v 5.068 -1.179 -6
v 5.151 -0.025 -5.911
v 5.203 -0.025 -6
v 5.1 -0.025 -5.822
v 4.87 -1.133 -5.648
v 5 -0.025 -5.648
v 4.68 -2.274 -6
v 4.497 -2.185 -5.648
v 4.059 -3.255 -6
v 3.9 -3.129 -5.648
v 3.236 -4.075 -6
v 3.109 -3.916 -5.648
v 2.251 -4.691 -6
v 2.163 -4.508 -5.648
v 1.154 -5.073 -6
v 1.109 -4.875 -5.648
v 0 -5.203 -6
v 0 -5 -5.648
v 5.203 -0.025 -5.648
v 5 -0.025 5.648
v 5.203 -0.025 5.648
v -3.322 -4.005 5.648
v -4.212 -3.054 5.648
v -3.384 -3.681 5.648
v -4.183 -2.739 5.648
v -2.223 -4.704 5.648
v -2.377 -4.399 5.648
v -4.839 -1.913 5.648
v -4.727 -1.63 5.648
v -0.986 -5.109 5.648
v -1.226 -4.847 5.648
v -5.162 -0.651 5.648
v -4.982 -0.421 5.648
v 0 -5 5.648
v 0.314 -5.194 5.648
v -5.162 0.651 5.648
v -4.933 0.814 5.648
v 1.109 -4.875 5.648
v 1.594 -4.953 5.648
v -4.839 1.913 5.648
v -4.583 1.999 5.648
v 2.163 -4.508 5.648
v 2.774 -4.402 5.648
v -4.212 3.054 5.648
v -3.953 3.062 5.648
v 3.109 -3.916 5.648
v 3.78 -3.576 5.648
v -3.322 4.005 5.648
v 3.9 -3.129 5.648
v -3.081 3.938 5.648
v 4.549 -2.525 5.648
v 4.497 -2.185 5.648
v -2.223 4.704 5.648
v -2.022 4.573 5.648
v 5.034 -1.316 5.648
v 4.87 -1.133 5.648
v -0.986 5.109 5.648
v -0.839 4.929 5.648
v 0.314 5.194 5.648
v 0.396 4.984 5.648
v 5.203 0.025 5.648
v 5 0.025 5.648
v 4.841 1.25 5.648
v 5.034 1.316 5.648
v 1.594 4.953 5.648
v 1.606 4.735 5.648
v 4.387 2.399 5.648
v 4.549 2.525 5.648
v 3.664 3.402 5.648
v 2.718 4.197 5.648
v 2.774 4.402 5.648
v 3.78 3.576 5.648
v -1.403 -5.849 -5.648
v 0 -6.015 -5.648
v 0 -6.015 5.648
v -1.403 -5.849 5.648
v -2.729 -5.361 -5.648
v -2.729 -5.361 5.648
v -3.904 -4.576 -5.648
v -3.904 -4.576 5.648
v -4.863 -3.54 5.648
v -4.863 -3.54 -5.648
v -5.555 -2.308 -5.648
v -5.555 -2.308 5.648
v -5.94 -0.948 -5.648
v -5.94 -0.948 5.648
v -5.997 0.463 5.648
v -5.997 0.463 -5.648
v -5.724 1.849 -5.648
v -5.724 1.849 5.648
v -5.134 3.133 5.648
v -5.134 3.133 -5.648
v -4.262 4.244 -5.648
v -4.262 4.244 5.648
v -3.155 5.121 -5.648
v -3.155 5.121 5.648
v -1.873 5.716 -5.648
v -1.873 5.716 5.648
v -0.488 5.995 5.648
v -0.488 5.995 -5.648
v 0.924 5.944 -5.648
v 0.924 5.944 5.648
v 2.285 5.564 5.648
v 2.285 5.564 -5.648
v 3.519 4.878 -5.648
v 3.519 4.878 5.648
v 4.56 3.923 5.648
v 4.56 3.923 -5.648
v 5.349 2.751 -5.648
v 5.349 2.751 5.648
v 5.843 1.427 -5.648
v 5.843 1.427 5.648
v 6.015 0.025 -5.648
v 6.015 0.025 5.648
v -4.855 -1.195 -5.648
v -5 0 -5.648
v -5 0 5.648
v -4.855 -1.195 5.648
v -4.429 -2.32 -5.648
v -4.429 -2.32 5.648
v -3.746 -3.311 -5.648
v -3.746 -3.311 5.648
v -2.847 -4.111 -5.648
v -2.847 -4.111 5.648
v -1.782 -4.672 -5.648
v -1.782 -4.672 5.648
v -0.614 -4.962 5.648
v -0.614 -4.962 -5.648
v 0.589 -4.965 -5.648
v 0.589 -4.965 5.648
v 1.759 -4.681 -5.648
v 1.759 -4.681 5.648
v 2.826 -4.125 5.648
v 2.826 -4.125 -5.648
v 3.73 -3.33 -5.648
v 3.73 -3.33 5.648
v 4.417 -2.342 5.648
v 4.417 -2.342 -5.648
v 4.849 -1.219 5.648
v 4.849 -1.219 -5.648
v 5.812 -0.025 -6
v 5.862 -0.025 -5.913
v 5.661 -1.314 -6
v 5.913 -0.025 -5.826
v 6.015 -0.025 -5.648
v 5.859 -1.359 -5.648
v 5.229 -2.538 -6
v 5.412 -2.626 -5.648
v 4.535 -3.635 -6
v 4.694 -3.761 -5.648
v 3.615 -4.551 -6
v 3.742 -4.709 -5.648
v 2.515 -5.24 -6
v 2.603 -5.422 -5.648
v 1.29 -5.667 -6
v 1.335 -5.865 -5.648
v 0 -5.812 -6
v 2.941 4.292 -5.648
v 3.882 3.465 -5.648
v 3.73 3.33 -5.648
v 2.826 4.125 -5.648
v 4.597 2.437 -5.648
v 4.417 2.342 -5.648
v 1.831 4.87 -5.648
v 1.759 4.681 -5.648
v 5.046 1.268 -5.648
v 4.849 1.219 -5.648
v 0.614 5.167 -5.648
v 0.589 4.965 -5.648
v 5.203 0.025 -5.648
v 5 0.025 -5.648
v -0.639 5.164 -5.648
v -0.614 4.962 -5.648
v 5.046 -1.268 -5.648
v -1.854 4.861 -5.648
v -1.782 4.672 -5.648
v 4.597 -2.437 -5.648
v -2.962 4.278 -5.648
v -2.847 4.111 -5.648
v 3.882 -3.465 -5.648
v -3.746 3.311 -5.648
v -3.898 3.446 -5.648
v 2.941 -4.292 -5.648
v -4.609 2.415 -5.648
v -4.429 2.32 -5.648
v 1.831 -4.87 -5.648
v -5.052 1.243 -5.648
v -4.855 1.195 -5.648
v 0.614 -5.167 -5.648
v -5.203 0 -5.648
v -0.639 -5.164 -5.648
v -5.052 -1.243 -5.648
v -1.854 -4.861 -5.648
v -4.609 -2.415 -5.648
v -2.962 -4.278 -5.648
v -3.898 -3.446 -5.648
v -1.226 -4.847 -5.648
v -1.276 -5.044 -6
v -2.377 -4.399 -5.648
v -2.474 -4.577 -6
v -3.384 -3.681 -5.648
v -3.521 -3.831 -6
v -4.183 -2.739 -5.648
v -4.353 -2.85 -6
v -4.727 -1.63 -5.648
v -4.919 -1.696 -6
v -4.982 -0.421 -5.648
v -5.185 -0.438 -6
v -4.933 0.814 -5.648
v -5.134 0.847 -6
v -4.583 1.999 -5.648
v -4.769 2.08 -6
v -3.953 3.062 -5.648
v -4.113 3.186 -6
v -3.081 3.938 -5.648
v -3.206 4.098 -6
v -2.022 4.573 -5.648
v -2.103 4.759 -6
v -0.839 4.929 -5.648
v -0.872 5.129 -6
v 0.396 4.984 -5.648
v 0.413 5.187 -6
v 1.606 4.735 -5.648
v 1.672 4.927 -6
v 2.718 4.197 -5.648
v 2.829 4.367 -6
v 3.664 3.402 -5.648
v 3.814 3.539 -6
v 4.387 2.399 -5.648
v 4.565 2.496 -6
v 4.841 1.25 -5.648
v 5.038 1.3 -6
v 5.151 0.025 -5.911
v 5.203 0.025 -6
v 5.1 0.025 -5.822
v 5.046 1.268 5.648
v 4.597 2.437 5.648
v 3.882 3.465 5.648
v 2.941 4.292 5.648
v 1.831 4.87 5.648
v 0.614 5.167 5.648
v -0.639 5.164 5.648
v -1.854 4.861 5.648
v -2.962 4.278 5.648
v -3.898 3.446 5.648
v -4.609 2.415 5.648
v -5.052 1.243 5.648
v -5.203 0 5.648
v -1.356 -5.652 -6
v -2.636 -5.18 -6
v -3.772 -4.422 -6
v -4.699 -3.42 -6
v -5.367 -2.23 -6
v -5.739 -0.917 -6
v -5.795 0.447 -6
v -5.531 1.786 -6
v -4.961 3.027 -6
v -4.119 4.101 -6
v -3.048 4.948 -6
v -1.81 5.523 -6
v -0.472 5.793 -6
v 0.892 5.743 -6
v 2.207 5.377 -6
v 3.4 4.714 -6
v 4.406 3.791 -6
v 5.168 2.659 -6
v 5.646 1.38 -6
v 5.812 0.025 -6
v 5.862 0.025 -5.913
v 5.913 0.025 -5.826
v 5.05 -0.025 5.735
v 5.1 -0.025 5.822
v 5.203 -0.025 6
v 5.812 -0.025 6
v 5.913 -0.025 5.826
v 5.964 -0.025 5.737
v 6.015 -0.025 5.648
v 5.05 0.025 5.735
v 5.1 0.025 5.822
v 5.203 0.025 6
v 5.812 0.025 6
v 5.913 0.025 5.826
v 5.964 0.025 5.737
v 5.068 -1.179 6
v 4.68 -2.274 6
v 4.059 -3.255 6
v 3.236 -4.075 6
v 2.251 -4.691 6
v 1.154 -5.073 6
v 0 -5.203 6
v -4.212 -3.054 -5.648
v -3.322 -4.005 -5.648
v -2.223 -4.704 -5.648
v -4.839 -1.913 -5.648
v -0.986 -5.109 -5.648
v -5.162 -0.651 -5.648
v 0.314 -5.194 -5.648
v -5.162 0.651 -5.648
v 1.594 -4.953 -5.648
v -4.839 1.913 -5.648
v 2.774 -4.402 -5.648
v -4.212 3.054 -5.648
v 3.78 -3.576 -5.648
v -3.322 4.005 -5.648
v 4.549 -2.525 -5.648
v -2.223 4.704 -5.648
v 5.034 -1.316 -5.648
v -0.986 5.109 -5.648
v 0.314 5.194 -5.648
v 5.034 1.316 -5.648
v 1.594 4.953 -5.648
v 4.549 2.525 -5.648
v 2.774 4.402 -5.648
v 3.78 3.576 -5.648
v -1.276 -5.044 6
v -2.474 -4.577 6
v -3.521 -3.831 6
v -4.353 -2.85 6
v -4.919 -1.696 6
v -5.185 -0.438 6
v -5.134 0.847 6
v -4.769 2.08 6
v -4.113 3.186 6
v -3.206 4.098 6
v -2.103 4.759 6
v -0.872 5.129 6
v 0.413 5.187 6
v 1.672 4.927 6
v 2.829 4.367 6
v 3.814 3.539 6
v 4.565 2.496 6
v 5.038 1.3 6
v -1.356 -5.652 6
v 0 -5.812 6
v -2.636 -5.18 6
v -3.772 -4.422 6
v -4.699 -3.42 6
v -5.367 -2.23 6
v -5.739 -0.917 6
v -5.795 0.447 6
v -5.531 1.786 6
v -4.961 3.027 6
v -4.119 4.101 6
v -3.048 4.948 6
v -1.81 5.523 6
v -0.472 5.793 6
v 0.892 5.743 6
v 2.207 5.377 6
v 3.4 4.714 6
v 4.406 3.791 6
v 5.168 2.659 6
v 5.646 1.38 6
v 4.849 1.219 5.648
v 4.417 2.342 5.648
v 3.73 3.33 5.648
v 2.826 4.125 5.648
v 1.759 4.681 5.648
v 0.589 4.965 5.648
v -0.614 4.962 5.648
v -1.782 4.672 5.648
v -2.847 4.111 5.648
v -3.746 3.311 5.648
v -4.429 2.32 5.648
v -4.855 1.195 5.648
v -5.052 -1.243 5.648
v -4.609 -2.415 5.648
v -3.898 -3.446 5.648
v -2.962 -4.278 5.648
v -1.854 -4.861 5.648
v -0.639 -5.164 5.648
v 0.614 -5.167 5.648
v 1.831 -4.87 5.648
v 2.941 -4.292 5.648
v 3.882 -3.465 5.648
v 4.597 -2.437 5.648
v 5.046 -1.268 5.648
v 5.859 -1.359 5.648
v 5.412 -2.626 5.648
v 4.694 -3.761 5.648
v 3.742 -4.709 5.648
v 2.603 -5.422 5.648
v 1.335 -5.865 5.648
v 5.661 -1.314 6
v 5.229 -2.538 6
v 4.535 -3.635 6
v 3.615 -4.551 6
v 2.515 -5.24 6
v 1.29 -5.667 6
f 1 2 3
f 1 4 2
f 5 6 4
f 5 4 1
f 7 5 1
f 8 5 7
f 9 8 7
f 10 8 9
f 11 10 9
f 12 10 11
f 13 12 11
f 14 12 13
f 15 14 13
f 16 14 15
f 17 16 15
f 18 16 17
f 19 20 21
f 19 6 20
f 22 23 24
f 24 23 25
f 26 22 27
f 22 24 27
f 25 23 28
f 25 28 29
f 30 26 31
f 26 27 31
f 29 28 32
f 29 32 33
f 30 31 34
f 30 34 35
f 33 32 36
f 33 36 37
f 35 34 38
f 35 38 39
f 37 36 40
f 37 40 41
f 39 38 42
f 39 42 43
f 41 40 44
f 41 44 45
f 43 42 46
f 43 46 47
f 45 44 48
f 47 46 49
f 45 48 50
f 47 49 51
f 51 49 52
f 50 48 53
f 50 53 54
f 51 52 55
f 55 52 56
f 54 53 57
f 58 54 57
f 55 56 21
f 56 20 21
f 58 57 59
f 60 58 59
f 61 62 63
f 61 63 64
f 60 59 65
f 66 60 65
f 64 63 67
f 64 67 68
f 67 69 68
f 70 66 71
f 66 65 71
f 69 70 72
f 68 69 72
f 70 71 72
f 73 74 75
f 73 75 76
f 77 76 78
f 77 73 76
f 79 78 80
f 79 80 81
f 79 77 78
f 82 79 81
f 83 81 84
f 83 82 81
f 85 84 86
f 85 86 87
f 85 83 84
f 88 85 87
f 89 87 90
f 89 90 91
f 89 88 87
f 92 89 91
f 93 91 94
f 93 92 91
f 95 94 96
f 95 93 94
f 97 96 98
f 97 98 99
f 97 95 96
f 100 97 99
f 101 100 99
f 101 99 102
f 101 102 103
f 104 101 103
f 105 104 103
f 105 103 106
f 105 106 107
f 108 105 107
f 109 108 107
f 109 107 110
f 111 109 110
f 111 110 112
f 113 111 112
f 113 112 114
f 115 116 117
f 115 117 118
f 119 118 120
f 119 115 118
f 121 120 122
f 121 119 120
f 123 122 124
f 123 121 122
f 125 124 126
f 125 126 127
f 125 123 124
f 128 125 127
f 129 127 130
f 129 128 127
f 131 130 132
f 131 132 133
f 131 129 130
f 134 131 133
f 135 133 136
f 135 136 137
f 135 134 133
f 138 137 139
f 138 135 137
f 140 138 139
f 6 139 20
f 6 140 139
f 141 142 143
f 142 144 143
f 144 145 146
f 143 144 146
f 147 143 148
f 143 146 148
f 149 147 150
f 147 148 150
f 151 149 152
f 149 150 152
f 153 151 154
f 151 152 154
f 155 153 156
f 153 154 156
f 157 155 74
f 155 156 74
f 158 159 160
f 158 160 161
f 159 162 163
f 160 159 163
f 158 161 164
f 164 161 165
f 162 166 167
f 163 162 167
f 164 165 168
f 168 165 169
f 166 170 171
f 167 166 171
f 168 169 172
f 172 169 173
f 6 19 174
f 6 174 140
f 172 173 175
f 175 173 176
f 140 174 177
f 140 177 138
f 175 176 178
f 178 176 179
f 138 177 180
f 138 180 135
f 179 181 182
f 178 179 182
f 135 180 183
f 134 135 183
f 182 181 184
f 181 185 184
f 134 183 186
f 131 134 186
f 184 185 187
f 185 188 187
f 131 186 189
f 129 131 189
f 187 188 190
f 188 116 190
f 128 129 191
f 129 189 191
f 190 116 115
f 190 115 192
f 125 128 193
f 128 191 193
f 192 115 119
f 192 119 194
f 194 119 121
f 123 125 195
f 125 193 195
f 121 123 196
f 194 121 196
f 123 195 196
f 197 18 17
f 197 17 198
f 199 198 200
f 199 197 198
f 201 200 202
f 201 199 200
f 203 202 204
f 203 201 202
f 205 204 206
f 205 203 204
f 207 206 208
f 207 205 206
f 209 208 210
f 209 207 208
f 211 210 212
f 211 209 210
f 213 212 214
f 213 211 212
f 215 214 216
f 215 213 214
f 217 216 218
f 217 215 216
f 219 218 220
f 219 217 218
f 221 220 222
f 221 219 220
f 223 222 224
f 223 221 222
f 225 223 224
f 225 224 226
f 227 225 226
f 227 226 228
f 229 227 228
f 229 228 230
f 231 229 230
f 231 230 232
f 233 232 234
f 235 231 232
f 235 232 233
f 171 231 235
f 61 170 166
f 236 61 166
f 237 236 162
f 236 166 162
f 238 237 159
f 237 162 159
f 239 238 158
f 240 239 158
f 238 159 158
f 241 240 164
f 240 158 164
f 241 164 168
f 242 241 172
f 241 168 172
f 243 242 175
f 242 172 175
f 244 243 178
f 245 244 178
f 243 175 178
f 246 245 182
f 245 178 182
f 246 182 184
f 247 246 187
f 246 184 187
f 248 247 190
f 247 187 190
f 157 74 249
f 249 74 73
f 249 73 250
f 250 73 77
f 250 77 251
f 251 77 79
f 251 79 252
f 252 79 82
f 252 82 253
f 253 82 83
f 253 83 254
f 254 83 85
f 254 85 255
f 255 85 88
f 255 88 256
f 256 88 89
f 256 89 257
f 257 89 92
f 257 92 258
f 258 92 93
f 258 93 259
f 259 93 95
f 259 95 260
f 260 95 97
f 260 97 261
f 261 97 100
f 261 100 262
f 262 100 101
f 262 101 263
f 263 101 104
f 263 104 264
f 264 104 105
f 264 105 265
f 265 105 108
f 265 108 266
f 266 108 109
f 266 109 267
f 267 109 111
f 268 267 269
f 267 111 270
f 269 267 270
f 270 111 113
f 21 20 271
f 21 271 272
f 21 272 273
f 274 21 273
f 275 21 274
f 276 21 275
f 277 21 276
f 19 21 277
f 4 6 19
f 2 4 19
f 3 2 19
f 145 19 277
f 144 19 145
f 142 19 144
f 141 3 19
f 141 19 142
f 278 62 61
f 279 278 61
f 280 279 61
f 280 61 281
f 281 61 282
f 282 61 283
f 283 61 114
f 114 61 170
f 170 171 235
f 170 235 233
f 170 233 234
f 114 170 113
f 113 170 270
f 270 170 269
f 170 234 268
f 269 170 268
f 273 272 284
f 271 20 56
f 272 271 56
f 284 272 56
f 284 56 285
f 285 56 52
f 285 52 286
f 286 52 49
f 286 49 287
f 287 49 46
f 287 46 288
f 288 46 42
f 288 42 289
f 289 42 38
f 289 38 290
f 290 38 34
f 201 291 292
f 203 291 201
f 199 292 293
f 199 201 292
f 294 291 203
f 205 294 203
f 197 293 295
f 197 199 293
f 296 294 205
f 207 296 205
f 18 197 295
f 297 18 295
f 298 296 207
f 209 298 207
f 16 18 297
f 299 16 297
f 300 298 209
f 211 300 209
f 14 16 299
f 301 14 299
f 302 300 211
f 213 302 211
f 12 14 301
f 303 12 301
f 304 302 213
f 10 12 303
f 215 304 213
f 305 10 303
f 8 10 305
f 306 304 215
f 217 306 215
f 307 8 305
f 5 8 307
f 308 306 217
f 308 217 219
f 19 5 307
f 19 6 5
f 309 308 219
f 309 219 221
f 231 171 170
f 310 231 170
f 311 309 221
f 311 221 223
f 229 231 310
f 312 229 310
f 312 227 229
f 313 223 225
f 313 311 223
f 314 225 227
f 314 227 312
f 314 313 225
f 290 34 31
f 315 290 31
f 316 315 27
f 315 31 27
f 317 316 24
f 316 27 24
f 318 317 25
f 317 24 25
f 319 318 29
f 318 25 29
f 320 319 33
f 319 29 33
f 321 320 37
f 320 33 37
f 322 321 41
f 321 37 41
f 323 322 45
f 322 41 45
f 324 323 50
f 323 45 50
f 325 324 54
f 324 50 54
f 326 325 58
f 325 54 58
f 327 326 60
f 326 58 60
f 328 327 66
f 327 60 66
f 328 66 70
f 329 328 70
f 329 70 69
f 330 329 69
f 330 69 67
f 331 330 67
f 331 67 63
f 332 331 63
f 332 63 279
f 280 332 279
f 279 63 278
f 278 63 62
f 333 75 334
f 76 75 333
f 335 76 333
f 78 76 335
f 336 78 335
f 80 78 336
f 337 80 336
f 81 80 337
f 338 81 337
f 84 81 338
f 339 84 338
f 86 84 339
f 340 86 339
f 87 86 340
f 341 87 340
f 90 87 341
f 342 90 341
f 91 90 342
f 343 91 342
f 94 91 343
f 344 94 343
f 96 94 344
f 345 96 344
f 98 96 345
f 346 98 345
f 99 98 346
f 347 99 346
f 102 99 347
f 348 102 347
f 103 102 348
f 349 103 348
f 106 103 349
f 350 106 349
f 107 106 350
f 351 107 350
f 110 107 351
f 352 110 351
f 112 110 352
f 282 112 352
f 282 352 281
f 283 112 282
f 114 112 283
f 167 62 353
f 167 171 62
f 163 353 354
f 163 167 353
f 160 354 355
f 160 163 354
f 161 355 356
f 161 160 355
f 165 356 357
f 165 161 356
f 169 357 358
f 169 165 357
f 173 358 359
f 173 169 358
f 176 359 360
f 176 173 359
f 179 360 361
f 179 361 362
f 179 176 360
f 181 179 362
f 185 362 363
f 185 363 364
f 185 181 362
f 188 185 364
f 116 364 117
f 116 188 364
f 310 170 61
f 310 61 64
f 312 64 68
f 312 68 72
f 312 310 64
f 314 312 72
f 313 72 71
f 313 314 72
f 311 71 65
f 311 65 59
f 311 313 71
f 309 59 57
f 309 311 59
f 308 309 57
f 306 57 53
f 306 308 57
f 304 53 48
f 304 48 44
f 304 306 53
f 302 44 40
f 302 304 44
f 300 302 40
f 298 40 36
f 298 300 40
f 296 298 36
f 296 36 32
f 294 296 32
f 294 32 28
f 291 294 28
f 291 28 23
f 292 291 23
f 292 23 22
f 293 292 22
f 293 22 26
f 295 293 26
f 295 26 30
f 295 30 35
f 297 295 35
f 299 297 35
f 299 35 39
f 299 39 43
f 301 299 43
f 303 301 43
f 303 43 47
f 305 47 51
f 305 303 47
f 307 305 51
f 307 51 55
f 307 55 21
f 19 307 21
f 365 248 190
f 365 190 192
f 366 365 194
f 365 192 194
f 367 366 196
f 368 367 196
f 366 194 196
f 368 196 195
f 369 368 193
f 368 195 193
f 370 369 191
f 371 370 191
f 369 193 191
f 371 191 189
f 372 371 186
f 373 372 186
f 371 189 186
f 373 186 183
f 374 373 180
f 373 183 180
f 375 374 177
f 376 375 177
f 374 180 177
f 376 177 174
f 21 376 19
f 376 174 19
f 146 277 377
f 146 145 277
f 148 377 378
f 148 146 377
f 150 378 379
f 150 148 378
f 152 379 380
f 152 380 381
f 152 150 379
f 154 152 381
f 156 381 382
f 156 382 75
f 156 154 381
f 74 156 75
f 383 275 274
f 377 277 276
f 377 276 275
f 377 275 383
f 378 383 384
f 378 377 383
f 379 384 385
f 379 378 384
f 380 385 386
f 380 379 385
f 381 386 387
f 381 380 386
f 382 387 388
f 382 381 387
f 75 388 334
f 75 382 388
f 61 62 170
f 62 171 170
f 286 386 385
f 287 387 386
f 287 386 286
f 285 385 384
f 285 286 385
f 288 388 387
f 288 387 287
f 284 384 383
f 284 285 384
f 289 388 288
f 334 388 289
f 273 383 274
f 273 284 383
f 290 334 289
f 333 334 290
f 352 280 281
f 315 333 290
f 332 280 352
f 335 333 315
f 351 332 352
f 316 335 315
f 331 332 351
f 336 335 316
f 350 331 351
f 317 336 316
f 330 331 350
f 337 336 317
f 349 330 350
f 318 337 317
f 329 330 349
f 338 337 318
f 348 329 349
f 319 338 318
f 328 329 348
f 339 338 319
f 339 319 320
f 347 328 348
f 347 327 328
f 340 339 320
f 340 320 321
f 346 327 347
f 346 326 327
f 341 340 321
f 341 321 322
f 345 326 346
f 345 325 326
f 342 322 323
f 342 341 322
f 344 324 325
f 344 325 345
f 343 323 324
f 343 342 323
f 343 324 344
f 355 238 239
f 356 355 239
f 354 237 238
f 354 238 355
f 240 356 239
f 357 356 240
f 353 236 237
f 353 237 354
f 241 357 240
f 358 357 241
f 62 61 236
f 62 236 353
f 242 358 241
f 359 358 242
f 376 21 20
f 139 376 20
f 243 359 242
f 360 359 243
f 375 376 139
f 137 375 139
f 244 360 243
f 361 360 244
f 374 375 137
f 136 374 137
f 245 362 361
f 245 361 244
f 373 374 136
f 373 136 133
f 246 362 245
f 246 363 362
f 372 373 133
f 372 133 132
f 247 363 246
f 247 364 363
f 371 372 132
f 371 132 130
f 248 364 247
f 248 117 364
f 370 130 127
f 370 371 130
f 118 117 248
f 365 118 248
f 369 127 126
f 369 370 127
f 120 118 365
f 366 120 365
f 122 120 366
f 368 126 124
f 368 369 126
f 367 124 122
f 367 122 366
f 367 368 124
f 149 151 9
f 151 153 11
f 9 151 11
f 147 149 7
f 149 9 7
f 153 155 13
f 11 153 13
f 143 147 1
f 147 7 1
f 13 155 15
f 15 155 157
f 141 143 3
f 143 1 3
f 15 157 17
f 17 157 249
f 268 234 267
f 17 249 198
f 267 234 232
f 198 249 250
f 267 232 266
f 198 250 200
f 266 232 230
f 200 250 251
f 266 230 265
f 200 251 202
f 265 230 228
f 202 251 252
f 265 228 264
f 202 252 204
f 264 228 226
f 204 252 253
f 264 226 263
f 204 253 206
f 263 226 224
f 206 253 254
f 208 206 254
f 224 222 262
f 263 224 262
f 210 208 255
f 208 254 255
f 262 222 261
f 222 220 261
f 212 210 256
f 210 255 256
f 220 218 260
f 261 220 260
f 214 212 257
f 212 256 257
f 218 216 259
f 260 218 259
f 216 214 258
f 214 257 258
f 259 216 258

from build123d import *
from OCP.BRepFilletAPI import BRepFilletAPI_MakeChamfer

# Parameters (mm, degrees)
SKETCH3_W                = 12
SKETCH3_H                = 1.015
CHAMFER1_SIZE            = 0.203
CHAMFER1_SIZE2           = 0.351606314
CHAMFER2_SIZE            = 0.203
CHAMFER2_SIZE2           = 0.351606314
CUT_EXTRUDE1_DEPTH       = 5.648394
CUT_EXTRUDE1_DEPTH_BACK  = 5.648394
SKETCH5_R                = 5.203
BOSS_EXTRUDE1_DEPTH      = 5.648394
BOSS_EXTRUDE1_DEPTH_BACK = 5.648394
SKETCH6_R                = 5.203
SKETCH6_R_2              = 5
CUT_EXTRUDE2_DEPTH       = 11.409632558
CUT_EXTRUDE2_DEPTH_BACK  = 11.409632558
SKETCH7_W                = 6.015
SKETCH7_H                = 0.05


with BuildPart() as part:
    # Sketch3 → Revolve1 (revolve)
    with BuildSketch(Plane(origin=(0, 0, 0), x_dir=(0, 0, -1), z_dir=(1, 0, 0)), mode=Mode.PRIVATE) as revolve1_sk:
        with Locations((0, 5.5075)):
            Rectangle(SKETCH3_W, SKETCH3_H)
    revolve(revolve1_sk.sketch.rotate(Axis((0, 0, 6), (0, 0, -1)), 180), axis=Axis((0, 0, 6), (0, 0, -1)))

    # Chamfer1: one chamfer whose edges measure the first distance from different faces: ONE call of the kernel's chamfer builder (chamfer() names one face for all edges)
    chamfer1_edges_1 = [part.edges().sort_by_distance(p)[0] for p in [
        (0, 6.015, -6),
    ]]
    chamfer1_side_1 = [part.faces().sort_by_distance(p)[0] for p in [
        (0, 5.170129892, -6),
    ]]
    chamfer1_edges_2 = [part.edges().sort_by_distance(p)[0] for p in [
        (0, 5, 6),
    ]]
    chamfer1_side_2 = [part.faces().sort_by_distance(p)[0] for p in [
        (0, 5.844870108, 6),
    ]]
    chamfer1 = BRepFilletAPI_MakeChamfer(part.part.solid().wrapped)
    for e in chamfer1_edges_1:
        chamfer1.Add(CHAMFER1_SIZE, CHAMFER1_SIZE2, e.wrapped, chamfer1_side_1[0].wrapped)  # the first distance lies on this face
    for e in chamfer1_edges_2:
        chamfer1.Add(CHAMFER1_SIZE, CHAMFER1_SIZE2, e.wrapped, chamfer1_side_2[0].wrapped)  # the first distance lies on this face
    add(Compound.cast(chamfer1.Shape()), mode=Mode.REPLACE)

    # Chamfer2: one chamfer whose edges measure the first distance from different faces: ONE call of the kernel's chamfer builder (chamfer() names one face for all edges)
    chamfer2_edges_1 = [part.edges().sort_by_distance(p)[0] for p in [
        (0, 6.015, 6),
    ]]
    chamfer2_side_1 = [part.faces().sort_by_distance(p)[0] for p in [
        (0, 5.373129892, 6),
    ]]
    chamfer2_edges_2 = [part.edges().sort_by_distance(p)[0] for p in [
        (0, 5, -6),
    ]]
    chamfer2_side_2 = [part.faces().sort_by_distance(p)[0] for p in [
        (0, 5.647611816, -6),
    ]]
    chamfer2 = BRepFilletAPI_MakeChamfer(part.part.solid().wrapped)
    for e in chamfer2_edges_1:
        chamfer2.Add(CHAMFER2_SIZE, CHAMFER2_SIZE2, e.wrapped, chamfer2_side_1[0].wrapped)  # the first distance lies on this face
    for e in chamfer2_edges_2:
        chamfer2.Add(CHAMFER2_SIZE, CHAMFER2_SIZE2, e.wrapped, chamfer2_side_2[0].wrapped)  # the first distance lies on this face
    add(Compound.cast(chamfer2.Shape()), mode=Mode.REPLACE)

    # Sketch5 → Cut-Extrude1 (cut, two sides: drawn at the far end of the back side and taken through both)
    with BuildSketch(Plane.XY.offset(-CUT_EXTRUDE1_DEPTH_BACK)):
        Circle(SKETCH5_R)
    extrude(amount=CUT_EXTRUDE1_DEPTH + CUT_EXTRUDE1_DEPTH_BACK, mode=Mode.SUBTRACT)


with BuildPart() as body_2:
    # Sketch6 → Boss-Extrude1 (new, two sides: drawn at the far end of the back side and taken through both)
    with BuildSketch(Plane.XY.offset(-BOSS_EXTRUDE1_DEPTH_BACK)):
        with Locations(Location((0, 0, 0), (0, 0, 180))):
            Circle(SKETCH6_R)
        with Locations(Location((0, 0, 0), (0, 0, 180))):
            Circle(SKETCH6_R_2, mode=Mode.SUBTRACT)
    extrude(amount=BOSS_EXTRUDE1_DEPTH + BOSS_EXTRUDE1_DEPTH_BACK)


with BuildPart() as cut_extrude2_tool:
    # Sketch7 → Cut-Extrude2 (new, two sides: drawn at the far end of the back side and taken through both)
    with BuildSketch(Plane.XY.offset(-CUT_EXTRUDE2_DEPTH_BACK)):
        with Locations((3.0075, 0)):
            Rectangle(SKETCH7_W, SKETCH7_H)
    extrude(amount=CUT_EXTRUDE2_DEPTH + CUT_EXTRUDE2_DEPTH_BACK)


with BuildPart() as part_1:
    add(part.part)

    # Cut-Extrude2: cut by cut_extrude2_tool
    add(cut_extrude2_tool.part, mode=Mode.SUBTRACT)


with BuildPart() as body_2_1:
    add(body_2.part)

    # Cut-Extrude2: cut by cut_extrude2_tool
    add(cut_extrude2_tool.part, mode=Mode.SUBTRACT)


solid = Compound([part_1.part, body_2_1.part])
